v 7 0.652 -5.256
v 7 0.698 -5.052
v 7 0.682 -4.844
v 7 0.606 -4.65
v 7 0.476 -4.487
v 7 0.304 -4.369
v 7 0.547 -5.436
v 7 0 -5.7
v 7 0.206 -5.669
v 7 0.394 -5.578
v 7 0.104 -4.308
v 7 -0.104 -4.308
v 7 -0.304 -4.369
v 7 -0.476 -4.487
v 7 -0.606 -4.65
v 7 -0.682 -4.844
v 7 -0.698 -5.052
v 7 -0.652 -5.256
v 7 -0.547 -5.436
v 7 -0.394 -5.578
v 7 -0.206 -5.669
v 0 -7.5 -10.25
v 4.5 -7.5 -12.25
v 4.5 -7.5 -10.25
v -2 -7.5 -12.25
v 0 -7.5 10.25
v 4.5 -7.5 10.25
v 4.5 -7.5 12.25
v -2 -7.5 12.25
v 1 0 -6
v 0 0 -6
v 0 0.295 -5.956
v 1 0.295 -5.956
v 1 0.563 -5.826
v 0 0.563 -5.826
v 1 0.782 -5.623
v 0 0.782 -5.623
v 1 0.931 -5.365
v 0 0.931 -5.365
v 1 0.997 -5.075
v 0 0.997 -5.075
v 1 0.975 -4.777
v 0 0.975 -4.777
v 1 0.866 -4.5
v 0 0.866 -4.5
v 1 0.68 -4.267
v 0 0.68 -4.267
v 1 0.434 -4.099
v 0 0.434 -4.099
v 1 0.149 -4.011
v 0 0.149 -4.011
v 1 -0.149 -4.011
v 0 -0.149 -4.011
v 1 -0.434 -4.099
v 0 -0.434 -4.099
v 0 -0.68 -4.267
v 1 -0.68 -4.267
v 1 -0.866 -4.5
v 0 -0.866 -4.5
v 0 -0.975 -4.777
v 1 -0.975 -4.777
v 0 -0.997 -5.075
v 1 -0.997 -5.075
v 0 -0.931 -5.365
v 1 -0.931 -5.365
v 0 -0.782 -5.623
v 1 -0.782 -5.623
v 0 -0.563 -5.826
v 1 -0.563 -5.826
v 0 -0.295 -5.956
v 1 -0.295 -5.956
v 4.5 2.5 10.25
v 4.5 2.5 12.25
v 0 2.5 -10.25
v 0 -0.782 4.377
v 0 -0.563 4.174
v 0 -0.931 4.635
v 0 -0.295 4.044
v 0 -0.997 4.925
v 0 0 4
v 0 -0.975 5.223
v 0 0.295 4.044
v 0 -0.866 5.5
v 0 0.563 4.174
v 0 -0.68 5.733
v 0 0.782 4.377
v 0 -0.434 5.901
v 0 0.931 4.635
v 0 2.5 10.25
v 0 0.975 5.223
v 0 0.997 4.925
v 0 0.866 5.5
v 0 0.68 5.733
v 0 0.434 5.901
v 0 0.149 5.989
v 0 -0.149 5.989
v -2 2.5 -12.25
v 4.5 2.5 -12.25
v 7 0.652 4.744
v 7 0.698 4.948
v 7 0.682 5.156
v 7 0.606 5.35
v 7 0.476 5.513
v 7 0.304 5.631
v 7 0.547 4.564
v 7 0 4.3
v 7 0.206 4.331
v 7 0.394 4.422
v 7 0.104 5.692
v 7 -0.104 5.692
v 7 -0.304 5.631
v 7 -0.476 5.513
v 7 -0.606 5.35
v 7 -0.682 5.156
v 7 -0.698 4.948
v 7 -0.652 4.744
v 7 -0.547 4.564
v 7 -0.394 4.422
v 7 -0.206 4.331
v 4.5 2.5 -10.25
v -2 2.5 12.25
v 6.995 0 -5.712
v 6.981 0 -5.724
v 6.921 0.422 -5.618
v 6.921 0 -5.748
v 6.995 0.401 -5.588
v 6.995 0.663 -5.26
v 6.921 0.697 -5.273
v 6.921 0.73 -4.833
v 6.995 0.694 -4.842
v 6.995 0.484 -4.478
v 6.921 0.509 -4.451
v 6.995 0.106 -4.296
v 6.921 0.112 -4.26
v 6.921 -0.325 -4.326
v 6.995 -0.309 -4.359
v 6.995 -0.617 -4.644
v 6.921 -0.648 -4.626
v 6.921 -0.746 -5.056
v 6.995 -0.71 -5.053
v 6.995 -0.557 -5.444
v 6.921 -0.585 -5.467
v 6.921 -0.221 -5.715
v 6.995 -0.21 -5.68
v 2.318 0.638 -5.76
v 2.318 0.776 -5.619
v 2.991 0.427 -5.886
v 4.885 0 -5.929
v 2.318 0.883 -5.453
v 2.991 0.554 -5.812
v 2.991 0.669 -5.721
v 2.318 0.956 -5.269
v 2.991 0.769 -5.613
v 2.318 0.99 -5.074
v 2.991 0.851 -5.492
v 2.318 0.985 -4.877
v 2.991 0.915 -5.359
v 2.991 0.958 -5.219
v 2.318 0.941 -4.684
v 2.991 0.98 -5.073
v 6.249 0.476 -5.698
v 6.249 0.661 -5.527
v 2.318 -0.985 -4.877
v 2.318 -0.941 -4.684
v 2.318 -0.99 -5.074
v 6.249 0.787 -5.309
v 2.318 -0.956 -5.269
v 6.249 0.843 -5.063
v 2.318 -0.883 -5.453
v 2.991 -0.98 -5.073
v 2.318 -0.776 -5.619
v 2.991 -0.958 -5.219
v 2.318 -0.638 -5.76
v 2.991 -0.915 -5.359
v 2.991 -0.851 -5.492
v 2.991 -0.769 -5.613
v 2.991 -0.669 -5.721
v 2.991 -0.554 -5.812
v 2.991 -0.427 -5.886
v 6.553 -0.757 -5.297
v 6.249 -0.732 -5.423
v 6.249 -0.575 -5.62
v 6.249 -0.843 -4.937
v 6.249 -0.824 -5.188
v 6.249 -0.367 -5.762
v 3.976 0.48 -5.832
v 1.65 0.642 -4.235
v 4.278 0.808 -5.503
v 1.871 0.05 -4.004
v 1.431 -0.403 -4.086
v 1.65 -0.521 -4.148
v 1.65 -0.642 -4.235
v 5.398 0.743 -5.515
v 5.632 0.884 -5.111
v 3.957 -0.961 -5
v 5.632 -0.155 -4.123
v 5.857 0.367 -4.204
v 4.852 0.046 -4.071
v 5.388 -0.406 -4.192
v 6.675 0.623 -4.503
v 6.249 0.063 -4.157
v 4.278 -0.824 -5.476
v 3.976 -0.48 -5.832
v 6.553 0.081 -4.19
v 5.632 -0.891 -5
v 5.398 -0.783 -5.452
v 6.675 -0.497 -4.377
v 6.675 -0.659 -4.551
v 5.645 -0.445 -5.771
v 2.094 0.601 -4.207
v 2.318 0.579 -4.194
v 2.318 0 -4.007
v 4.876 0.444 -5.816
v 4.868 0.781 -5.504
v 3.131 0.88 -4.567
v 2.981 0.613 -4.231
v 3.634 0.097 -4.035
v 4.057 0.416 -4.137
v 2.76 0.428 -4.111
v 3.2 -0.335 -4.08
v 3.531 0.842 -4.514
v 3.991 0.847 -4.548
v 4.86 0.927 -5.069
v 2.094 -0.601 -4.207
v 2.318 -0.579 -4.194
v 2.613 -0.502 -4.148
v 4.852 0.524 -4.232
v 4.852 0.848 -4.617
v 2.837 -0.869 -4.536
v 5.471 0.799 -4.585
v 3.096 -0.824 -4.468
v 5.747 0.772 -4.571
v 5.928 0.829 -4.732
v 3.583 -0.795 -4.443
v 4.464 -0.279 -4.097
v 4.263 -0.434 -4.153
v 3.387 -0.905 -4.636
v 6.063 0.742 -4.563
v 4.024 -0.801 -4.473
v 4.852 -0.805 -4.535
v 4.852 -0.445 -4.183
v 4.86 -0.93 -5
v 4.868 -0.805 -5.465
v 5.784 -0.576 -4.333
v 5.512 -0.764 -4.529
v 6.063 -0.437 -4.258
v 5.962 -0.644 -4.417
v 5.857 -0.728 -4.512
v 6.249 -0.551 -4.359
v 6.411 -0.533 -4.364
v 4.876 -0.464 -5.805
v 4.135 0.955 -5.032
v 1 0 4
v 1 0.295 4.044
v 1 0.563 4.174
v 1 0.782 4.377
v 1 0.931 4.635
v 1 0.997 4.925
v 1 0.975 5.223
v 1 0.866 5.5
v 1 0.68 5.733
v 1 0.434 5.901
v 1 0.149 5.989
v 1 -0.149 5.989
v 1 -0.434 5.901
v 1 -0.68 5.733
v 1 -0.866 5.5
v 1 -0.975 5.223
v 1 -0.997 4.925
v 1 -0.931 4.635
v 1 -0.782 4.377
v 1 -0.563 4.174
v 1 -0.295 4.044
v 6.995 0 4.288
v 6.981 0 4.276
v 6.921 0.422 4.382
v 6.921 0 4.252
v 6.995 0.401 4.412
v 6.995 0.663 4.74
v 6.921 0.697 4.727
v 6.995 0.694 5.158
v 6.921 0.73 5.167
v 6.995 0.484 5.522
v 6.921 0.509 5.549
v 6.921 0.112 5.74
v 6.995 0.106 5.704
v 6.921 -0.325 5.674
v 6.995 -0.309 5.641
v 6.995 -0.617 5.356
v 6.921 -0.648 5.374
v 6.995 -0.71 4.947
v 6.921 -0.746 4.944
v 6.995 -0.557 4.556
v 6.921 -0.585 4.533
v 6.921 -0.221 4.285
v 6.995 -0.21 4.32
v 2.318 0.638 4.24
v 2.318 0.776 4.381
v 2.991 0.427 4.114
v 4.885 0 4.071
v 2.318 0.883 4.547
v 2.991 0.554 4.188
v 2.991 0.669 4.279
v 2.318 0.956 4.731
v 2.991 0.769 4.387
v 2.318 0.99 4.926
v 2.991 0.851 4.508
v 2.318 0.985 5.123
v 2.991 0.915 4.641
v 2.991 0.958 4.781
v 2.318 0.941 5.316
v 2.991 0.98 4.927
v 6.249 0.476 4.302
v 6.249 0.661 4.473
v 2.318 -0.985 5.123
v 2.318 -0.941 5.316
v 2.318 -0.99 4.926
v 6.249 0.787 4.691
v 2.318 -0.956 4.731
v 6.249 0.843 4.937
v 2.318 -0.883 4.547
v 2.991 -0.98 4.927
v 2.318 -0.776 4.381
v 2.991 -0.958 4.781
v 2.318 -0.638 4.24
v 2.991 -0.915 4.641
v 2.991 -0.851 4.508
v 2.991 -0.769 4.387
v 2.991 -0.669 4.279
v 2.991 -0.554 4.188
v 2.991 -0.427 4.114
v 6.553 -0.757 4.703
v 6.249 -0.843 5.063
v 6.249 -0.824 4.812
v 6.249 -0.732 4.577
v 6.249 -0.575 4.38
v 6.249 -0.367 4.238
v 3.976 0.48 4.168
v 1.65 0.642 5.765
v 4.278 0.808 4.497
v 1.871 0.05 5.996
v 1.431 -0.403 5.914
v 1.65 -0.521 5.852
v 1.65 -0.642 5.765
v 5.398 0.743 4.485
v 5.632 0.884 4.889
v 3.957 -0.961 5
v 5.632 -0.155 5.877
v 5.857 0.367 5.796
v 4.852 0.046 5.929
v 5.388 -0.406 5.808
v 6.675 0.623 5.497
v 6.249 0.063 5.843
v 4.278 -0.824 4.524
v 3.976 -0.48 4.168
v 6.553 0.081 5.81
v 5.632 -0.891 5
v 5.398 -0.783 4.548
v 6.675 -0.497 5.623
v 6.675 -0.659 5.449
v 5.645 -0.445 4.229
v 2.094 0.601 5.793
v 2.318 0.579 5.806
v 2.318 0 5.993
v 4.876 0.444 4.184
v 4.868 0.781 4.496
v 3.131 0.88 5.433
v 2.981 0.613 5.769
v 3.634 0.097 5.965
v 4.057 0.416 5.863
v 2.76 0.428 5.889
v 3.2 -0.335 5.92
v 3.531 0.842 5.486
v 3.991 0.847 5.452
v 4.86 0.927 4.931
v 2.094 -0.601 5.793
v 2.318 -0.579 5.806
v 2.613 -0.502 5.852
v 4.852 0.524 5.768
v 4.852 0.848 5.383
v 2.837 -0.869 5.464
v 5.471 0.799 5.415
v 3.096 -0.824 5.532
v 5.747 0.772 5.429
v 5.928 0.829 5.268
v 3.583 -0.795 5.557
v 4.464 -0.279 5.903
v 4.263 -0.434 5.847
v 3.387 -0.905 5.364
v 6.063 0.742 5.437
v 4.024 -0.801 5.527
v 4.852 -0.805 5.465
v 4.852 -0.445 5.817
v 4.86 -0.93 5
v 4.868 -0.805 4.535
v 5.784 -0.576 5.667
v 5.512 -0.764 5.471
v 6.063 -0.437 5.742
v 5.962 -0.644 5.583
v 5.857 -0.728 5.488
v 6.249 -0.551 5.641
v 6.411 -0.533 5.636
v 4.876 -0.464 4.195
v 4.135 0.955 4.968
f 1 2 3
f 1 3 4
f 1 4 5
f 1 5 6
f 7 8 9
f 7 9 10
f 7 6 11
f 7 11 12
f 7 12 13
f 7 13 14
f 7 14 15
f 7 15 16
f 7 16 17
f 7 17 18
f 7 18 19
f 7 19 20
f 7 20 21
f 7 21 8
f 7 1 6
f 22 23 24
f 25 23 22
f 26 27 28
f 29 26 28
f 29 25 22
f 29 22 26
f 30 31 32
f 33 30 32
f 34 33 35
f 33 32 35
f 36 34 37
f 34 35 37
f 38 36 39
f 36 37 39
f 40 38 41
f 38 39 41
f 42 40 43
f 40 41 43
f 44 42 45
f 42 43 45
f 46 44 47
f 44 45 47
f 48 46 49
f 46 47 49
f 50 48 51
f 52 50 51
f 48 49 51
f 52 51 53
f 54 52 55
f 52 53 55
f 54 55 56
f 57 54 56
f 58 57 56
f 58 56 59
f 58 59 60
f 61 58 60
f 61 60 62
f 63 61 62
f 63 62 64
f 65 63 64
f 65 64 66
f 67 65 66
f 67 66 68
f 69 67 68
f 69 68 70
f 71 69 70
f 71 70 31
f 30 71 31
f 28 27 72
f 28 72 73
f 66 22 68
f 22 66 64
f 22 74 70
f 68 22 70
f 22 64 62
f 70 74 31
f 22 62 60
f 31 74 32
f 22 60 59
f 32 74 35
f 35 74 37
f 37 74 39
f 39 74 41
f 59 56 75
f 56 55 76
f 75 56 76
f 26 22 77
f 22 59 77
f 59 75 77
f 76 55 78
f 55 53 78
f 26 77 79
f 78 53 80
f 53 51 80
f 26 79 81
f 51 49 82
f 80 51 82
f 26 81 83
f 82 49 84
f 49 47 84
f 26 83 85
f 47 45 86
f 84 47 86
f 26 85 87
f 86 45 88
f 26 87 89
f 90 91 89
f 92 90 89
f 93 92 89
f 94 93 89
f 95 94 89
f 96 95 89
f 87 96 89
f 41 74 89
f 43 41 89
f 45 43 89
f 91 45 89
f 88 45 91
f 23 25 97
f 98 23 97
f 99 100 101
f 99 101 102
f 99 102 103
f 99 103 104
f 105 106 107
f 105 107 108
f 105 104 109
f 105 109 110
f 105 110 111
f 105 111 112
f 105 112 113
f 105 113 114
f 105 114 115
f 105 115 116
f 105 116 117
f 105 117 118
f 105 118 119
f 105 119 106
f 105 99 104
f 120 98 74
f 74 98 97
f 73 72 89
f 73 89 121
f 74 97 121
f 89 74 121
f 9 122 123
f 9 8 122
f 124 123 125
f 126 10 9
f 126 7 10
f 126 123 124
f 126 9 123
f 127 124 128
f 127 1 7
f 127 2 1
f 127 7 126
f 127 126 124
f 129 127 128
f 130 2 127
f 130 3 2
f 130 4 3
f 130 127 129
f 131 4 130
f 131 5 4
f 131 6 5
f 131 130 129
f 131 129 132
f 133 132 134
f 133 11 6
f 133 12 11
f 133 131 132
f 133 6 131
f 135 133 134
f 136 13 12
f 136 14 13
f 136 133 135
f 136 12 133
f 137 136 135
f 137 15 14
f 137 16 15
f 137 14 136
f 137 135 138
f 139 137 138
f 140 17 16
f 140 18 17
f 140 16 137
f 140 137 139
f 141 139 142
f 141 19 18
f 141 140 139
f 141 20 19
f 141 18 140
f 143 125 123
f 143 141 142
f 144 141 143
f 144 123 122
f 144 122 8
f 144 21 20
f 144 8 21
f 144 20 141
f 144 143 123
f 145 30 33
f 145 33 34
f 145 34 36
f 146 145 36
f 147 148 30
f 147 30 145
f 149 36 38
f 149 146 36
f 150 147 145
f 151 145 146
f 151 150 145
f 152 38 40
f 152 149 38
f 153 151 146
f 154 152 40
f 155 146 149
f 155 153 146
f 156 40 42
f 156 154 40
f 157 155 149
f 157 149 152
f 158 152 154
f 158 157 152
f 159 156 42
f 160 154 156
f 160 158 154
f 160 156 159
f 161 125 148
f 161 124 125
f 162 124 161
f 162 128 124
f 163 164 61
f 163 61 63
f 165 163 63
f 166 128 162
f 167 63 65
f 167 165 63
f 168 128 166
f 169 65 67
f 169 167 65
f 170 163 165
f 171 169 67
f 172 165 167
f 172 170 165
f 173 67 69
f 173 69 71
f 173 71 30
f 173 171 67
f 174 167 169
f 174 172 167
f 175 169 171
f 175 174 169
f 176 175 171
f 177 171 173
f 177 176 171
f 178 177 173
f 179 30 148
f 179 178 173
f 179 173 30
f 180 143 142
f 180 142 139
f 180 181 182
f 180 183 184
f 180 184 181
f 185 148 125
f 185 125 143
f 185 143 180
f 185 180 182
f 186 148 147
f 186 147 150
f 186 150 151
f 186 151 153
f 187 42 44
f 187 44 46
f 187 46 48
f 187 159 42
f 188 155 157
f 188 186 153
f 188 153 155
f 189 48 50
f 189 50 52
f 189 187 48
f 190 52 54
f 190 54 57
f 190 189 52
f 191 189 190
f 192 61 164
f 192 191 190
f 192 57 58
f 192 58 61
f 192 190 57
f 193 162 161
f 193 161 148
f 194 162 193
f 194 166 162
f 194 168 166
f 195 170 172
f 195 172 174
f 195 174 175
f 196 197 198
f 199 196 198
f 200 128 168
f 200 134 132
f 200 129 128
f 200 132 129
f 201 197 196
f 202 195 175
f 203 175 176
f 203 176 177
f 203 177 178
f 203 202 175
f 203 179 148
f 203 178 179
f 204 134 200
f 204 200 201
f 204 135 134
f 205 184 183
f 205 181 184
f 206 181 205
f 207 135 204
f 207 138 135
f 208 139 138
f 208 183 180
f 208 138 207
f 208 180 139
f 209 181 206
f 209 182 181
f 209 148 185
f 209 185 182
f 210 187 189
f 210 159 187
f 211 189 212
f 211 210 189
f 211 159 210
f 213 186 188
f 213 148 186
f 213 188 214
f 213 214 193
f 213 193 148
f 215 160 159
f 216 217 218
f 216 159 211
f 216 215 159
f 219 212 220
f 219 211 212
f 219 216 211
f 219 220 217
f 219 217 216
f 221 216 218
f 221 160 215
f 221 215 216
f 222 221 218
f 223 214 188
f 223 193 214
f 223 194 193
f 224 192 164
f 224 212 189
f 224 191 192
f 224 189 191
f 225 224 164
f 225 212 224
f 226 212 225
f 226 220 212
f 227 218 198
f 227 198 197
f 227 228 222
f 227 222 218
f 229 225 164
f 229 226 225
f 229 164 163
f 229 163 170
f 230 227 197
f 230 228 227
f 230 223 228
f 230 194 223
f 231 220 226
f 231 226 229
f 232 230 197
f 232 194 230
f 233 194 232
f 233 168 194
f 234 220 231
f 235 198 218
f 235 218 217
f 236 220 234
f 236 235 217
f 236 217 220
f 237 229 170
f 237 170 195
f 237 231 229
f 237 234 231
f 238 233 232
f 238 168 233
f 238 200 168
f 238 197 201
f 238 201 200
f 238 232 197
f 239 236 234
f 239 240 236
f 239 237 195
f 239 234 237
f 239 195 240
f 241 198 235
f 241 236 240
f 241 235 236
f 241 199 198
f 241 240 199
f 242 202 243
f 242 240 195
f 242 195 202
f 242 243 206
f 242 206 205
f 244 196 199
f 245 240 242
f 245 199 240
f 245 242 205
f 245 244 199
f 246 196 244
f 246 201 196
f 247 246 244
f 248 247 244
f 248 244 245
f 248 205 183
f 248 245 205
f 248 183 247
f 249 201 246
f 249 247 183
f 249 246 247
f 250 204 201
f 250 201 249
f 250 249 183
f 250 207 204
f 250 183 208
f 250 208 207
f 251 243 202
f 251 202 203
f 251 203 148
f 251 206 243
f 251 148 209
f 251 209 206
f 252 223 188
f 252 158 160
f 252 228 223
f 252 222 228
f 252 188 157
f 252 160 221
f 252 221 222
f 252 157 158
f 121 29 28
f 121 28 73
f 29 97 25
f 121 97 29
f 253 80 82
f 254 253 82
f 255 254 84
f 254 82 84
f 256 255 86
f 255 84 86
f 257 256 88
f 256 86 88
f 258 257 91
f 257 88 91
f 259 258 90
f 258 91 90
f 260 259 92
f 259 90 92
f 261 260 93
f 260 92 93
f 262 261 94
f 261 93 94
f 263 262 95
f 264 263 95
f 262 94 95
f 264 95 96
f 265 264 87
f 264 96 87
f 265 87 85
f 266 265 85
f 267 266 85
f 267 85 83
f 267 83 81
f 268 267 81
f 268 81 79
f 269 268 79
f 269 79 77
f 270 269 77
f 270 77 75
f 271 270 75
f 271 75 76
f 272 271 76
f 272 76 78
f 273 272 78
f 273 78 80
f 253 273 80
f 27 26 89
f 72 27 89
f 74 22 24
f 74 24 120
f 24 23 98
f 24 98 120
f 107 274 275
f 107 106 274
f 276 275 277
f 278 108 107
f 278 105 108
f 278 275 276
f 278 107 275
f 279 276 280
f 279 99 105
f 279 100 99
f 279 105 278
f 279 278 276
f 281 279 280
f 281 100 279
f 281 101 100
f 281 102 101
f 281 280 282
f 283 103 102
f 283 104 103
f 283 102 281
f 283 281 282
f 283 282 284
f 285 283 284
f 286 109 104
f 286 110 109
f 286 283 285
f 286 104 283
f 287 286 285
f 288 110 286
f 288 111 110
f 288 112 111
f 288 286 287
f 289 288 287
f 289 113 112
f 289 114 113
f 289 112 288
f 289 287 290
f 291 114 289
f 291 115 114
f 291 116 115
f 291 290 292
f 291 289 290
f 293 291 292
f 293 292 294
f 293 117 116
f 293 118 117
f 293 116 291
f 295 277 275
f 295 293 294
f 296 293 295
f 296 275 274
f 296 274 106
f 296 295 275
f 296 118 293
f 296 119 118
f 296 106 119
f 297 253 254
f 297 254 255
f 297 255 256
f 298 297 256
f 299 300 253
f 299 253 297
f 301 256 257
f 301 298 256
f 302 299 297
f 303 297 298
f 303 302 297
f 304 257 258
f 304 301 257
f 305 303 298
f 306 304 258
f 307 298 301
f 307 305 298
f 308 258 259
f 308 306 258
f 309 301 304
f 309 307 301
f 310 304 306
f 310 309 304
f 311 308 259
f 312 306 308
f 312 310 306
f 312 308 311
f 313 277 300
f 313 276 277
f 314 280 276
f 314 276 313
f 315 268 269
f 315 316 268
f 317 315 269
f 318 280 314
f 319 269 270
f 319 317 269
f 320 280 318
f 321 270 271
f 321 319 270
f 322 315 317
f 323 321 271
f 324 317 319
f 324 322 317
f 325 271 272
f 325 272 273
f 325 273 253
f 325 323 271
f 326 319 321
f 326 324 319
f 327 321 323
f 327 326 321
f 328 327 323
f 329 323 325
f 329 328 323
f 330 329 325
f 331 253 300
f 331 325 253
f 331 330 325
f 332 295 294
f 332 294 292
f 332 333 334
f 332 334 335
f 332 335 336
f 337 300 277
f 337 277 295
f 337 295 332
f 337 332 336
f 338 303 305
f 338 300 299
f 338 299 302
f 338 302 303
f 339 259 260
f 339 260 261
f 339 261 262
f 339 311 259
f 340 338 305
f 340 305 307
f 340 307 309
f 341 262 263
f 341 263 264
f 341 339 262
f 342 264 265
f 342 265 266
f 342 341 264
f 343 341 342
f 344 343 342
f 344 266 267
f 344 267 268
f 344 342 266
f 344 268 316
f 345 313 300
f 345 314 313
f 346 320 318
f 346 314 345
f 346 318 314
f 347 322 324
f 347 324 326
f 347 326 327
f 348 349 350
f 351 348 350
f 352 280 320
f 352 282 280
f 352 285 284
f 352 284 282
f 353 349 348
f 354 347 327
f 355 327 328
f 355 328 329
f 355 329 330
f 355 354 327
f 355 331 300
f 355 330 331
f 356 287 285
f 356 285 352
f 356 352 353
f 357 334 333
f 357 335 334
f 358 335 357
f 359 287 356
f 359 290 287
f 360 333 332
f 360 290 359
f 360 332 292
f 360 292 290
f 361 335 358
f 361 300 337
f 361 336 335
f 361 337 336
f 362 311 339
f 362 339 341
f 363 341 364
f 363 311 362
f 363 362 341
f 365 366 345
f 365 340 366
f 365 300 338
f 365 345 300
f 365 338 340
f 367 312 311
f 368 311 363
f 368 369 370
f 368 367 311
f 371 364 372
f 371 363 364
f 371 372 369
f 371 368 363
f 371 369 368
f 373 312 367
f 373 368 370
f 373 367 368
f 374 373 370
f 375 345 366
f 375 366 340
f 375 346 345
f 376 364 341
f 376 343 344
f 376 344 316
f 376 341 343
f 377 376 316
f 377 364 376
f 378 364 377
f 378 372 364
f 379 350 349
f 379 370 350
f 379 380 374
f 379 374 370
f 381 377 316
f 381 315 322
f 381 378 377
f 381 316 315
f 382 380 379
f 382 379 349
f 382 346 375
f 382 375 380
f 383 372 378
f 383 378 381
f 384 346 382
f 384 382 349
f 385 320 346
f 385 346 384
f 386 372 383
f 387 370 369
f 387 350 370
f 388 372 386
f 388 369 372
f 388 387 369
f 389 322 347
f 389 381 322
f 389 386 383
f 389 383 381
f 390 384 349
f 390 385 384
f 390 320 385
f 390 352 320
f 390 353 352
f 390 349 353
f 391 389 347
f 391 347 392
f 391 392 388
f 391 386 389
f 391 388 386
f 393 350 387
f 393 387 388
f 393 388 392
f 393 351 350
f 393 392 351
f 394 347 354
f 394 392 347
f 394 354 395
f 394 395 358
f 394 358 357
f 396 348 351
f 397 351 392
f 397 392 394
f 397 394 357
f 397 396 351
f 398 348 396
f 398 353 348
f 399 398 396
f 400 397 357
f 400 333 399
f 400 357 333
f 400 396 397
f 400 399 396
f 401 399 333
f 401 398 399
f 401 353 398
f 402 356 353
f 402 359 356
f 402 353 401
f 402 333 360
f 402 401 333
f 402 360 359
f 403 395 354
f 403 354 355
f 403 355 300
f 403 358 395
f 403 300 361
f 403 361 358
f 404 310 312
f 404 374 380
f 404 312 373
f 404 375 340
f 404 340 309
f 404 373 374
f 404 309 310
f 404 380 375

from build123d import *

# Parameters (mm, degrees)
SKETCH1_R             = 1
BOSS_EXTRUDE1_DEPTH   = 7
BOSS_EXTRUDE1_2_DEPTH = 7
SKETCH2_W             = 20.5
SKETCH2_H             = 10
BOSS_EXTRUDE2_DEPTH   = 2
SKETCH4_W             = 2
SKETCH4_H             = 10
BOSS_EXTRUDE3_DEPTH   = 6.5
FILLET1_SIZE          = 6
FILLET1_SIZE_2        = 0.3


with BuildPart() as part:
    # Sketch1 → Boss-Extrude1 (new body)
    with BuildSketch(Plane(origin=(0, 0, 0), x_dir=(0, 0, -1), z_dir=(1, 0, 0))):
        with Locations((-5, 0)):
            Circle(SKETCH1_R)
    extrude(amount=BOSS_EXTRUDE1_DEPTH)



with BuildPart() as body_2:
    # Sketch1 → Boss-Extrude1 2 (new body)
    with BuildSketch(Plane(origin=(0, 0, 0), x_dir=(0, 0, -1), z_dir=(1, 0, 0))):
        with Locations((5, 0)):
            Circle(SKETCH1_R)
    extrude(amount=BOSS_EXTRUDE1_2_DEPTH)


with BuildPart() as part_1:
    add(part.part)

    add(body_2.part)  # Boss-Extrude2 merges body 2
    # Sketch2 → Boss-Extrude2 (add)
    with BuildSketch(Plane.ZY):
        with Locations((0, -2.5)):
            Rectangle(SKETCH2_W, SKETCH2_H)
    extrude(amount=BOSS_EXTRUDE2_DEPTH)

    # Sketch4 → Boss-Extrude3 (add)
    with BuildSketch(Plane.ZY.offset(2)):
        with Locations((-11.25, -2.5)):
            Rectangle(SKETCH4_W, SKETCH4_H)
        with Locations((11.25, -2.5)):
            Rectangle(SKETCH4_W, SKETCH4_H)
    extrude(amount=-BOSS_EXTRUDE3_DEPTH)

    # Fillet1
    # an asymmetric fillet: 6, 0.3 mm, written as the material it takes off along each edge
    with BuildSketch(Plane(origin=(7, 0, -5), x_dir=(0, 0, -1), z_dir=(0, -1, 0))) as fillet1_piece_1:
        with BuildLine():
            Bezier((1, -FILLET1_SIZE), (1, 0), (1 - FILLET1_SIZE_2, 0), weights=[1, 0.707106781, 1])
            Line((1 - FILLET1_SIZE_2, 0), (1, 0))
            Line((1, 0), (1, -FILLET1_SIZE))
        make_face()
    revolve(axis=Axis((7, 0, -5), (1, 0, 0)), mode=Mode.SUBTRACT)
    with BuildSketch(Plane(origin=(7, 0, 5), x_dir=(0, 0, -1), z_dir=(0, -1, 0))) as fillet1_piece_2:
        with BuildLine():
            Bezier((1, -FILLET1_SIZE), (1, 0), (1 - FILLET1_SIZE_2, 0), weights=[1, 0.707106781, 1])
            Line((1 - FILLET1_SIZE_2, 0), (1, 0))
            Line((1, 0), (1, -FILLET1_SIZE))
        make_face()
    revolve(axis=Axis((7, 0, 5), (1, 0, 0)), mode=Mode.SUBTRACT)


solid = part_1.part
